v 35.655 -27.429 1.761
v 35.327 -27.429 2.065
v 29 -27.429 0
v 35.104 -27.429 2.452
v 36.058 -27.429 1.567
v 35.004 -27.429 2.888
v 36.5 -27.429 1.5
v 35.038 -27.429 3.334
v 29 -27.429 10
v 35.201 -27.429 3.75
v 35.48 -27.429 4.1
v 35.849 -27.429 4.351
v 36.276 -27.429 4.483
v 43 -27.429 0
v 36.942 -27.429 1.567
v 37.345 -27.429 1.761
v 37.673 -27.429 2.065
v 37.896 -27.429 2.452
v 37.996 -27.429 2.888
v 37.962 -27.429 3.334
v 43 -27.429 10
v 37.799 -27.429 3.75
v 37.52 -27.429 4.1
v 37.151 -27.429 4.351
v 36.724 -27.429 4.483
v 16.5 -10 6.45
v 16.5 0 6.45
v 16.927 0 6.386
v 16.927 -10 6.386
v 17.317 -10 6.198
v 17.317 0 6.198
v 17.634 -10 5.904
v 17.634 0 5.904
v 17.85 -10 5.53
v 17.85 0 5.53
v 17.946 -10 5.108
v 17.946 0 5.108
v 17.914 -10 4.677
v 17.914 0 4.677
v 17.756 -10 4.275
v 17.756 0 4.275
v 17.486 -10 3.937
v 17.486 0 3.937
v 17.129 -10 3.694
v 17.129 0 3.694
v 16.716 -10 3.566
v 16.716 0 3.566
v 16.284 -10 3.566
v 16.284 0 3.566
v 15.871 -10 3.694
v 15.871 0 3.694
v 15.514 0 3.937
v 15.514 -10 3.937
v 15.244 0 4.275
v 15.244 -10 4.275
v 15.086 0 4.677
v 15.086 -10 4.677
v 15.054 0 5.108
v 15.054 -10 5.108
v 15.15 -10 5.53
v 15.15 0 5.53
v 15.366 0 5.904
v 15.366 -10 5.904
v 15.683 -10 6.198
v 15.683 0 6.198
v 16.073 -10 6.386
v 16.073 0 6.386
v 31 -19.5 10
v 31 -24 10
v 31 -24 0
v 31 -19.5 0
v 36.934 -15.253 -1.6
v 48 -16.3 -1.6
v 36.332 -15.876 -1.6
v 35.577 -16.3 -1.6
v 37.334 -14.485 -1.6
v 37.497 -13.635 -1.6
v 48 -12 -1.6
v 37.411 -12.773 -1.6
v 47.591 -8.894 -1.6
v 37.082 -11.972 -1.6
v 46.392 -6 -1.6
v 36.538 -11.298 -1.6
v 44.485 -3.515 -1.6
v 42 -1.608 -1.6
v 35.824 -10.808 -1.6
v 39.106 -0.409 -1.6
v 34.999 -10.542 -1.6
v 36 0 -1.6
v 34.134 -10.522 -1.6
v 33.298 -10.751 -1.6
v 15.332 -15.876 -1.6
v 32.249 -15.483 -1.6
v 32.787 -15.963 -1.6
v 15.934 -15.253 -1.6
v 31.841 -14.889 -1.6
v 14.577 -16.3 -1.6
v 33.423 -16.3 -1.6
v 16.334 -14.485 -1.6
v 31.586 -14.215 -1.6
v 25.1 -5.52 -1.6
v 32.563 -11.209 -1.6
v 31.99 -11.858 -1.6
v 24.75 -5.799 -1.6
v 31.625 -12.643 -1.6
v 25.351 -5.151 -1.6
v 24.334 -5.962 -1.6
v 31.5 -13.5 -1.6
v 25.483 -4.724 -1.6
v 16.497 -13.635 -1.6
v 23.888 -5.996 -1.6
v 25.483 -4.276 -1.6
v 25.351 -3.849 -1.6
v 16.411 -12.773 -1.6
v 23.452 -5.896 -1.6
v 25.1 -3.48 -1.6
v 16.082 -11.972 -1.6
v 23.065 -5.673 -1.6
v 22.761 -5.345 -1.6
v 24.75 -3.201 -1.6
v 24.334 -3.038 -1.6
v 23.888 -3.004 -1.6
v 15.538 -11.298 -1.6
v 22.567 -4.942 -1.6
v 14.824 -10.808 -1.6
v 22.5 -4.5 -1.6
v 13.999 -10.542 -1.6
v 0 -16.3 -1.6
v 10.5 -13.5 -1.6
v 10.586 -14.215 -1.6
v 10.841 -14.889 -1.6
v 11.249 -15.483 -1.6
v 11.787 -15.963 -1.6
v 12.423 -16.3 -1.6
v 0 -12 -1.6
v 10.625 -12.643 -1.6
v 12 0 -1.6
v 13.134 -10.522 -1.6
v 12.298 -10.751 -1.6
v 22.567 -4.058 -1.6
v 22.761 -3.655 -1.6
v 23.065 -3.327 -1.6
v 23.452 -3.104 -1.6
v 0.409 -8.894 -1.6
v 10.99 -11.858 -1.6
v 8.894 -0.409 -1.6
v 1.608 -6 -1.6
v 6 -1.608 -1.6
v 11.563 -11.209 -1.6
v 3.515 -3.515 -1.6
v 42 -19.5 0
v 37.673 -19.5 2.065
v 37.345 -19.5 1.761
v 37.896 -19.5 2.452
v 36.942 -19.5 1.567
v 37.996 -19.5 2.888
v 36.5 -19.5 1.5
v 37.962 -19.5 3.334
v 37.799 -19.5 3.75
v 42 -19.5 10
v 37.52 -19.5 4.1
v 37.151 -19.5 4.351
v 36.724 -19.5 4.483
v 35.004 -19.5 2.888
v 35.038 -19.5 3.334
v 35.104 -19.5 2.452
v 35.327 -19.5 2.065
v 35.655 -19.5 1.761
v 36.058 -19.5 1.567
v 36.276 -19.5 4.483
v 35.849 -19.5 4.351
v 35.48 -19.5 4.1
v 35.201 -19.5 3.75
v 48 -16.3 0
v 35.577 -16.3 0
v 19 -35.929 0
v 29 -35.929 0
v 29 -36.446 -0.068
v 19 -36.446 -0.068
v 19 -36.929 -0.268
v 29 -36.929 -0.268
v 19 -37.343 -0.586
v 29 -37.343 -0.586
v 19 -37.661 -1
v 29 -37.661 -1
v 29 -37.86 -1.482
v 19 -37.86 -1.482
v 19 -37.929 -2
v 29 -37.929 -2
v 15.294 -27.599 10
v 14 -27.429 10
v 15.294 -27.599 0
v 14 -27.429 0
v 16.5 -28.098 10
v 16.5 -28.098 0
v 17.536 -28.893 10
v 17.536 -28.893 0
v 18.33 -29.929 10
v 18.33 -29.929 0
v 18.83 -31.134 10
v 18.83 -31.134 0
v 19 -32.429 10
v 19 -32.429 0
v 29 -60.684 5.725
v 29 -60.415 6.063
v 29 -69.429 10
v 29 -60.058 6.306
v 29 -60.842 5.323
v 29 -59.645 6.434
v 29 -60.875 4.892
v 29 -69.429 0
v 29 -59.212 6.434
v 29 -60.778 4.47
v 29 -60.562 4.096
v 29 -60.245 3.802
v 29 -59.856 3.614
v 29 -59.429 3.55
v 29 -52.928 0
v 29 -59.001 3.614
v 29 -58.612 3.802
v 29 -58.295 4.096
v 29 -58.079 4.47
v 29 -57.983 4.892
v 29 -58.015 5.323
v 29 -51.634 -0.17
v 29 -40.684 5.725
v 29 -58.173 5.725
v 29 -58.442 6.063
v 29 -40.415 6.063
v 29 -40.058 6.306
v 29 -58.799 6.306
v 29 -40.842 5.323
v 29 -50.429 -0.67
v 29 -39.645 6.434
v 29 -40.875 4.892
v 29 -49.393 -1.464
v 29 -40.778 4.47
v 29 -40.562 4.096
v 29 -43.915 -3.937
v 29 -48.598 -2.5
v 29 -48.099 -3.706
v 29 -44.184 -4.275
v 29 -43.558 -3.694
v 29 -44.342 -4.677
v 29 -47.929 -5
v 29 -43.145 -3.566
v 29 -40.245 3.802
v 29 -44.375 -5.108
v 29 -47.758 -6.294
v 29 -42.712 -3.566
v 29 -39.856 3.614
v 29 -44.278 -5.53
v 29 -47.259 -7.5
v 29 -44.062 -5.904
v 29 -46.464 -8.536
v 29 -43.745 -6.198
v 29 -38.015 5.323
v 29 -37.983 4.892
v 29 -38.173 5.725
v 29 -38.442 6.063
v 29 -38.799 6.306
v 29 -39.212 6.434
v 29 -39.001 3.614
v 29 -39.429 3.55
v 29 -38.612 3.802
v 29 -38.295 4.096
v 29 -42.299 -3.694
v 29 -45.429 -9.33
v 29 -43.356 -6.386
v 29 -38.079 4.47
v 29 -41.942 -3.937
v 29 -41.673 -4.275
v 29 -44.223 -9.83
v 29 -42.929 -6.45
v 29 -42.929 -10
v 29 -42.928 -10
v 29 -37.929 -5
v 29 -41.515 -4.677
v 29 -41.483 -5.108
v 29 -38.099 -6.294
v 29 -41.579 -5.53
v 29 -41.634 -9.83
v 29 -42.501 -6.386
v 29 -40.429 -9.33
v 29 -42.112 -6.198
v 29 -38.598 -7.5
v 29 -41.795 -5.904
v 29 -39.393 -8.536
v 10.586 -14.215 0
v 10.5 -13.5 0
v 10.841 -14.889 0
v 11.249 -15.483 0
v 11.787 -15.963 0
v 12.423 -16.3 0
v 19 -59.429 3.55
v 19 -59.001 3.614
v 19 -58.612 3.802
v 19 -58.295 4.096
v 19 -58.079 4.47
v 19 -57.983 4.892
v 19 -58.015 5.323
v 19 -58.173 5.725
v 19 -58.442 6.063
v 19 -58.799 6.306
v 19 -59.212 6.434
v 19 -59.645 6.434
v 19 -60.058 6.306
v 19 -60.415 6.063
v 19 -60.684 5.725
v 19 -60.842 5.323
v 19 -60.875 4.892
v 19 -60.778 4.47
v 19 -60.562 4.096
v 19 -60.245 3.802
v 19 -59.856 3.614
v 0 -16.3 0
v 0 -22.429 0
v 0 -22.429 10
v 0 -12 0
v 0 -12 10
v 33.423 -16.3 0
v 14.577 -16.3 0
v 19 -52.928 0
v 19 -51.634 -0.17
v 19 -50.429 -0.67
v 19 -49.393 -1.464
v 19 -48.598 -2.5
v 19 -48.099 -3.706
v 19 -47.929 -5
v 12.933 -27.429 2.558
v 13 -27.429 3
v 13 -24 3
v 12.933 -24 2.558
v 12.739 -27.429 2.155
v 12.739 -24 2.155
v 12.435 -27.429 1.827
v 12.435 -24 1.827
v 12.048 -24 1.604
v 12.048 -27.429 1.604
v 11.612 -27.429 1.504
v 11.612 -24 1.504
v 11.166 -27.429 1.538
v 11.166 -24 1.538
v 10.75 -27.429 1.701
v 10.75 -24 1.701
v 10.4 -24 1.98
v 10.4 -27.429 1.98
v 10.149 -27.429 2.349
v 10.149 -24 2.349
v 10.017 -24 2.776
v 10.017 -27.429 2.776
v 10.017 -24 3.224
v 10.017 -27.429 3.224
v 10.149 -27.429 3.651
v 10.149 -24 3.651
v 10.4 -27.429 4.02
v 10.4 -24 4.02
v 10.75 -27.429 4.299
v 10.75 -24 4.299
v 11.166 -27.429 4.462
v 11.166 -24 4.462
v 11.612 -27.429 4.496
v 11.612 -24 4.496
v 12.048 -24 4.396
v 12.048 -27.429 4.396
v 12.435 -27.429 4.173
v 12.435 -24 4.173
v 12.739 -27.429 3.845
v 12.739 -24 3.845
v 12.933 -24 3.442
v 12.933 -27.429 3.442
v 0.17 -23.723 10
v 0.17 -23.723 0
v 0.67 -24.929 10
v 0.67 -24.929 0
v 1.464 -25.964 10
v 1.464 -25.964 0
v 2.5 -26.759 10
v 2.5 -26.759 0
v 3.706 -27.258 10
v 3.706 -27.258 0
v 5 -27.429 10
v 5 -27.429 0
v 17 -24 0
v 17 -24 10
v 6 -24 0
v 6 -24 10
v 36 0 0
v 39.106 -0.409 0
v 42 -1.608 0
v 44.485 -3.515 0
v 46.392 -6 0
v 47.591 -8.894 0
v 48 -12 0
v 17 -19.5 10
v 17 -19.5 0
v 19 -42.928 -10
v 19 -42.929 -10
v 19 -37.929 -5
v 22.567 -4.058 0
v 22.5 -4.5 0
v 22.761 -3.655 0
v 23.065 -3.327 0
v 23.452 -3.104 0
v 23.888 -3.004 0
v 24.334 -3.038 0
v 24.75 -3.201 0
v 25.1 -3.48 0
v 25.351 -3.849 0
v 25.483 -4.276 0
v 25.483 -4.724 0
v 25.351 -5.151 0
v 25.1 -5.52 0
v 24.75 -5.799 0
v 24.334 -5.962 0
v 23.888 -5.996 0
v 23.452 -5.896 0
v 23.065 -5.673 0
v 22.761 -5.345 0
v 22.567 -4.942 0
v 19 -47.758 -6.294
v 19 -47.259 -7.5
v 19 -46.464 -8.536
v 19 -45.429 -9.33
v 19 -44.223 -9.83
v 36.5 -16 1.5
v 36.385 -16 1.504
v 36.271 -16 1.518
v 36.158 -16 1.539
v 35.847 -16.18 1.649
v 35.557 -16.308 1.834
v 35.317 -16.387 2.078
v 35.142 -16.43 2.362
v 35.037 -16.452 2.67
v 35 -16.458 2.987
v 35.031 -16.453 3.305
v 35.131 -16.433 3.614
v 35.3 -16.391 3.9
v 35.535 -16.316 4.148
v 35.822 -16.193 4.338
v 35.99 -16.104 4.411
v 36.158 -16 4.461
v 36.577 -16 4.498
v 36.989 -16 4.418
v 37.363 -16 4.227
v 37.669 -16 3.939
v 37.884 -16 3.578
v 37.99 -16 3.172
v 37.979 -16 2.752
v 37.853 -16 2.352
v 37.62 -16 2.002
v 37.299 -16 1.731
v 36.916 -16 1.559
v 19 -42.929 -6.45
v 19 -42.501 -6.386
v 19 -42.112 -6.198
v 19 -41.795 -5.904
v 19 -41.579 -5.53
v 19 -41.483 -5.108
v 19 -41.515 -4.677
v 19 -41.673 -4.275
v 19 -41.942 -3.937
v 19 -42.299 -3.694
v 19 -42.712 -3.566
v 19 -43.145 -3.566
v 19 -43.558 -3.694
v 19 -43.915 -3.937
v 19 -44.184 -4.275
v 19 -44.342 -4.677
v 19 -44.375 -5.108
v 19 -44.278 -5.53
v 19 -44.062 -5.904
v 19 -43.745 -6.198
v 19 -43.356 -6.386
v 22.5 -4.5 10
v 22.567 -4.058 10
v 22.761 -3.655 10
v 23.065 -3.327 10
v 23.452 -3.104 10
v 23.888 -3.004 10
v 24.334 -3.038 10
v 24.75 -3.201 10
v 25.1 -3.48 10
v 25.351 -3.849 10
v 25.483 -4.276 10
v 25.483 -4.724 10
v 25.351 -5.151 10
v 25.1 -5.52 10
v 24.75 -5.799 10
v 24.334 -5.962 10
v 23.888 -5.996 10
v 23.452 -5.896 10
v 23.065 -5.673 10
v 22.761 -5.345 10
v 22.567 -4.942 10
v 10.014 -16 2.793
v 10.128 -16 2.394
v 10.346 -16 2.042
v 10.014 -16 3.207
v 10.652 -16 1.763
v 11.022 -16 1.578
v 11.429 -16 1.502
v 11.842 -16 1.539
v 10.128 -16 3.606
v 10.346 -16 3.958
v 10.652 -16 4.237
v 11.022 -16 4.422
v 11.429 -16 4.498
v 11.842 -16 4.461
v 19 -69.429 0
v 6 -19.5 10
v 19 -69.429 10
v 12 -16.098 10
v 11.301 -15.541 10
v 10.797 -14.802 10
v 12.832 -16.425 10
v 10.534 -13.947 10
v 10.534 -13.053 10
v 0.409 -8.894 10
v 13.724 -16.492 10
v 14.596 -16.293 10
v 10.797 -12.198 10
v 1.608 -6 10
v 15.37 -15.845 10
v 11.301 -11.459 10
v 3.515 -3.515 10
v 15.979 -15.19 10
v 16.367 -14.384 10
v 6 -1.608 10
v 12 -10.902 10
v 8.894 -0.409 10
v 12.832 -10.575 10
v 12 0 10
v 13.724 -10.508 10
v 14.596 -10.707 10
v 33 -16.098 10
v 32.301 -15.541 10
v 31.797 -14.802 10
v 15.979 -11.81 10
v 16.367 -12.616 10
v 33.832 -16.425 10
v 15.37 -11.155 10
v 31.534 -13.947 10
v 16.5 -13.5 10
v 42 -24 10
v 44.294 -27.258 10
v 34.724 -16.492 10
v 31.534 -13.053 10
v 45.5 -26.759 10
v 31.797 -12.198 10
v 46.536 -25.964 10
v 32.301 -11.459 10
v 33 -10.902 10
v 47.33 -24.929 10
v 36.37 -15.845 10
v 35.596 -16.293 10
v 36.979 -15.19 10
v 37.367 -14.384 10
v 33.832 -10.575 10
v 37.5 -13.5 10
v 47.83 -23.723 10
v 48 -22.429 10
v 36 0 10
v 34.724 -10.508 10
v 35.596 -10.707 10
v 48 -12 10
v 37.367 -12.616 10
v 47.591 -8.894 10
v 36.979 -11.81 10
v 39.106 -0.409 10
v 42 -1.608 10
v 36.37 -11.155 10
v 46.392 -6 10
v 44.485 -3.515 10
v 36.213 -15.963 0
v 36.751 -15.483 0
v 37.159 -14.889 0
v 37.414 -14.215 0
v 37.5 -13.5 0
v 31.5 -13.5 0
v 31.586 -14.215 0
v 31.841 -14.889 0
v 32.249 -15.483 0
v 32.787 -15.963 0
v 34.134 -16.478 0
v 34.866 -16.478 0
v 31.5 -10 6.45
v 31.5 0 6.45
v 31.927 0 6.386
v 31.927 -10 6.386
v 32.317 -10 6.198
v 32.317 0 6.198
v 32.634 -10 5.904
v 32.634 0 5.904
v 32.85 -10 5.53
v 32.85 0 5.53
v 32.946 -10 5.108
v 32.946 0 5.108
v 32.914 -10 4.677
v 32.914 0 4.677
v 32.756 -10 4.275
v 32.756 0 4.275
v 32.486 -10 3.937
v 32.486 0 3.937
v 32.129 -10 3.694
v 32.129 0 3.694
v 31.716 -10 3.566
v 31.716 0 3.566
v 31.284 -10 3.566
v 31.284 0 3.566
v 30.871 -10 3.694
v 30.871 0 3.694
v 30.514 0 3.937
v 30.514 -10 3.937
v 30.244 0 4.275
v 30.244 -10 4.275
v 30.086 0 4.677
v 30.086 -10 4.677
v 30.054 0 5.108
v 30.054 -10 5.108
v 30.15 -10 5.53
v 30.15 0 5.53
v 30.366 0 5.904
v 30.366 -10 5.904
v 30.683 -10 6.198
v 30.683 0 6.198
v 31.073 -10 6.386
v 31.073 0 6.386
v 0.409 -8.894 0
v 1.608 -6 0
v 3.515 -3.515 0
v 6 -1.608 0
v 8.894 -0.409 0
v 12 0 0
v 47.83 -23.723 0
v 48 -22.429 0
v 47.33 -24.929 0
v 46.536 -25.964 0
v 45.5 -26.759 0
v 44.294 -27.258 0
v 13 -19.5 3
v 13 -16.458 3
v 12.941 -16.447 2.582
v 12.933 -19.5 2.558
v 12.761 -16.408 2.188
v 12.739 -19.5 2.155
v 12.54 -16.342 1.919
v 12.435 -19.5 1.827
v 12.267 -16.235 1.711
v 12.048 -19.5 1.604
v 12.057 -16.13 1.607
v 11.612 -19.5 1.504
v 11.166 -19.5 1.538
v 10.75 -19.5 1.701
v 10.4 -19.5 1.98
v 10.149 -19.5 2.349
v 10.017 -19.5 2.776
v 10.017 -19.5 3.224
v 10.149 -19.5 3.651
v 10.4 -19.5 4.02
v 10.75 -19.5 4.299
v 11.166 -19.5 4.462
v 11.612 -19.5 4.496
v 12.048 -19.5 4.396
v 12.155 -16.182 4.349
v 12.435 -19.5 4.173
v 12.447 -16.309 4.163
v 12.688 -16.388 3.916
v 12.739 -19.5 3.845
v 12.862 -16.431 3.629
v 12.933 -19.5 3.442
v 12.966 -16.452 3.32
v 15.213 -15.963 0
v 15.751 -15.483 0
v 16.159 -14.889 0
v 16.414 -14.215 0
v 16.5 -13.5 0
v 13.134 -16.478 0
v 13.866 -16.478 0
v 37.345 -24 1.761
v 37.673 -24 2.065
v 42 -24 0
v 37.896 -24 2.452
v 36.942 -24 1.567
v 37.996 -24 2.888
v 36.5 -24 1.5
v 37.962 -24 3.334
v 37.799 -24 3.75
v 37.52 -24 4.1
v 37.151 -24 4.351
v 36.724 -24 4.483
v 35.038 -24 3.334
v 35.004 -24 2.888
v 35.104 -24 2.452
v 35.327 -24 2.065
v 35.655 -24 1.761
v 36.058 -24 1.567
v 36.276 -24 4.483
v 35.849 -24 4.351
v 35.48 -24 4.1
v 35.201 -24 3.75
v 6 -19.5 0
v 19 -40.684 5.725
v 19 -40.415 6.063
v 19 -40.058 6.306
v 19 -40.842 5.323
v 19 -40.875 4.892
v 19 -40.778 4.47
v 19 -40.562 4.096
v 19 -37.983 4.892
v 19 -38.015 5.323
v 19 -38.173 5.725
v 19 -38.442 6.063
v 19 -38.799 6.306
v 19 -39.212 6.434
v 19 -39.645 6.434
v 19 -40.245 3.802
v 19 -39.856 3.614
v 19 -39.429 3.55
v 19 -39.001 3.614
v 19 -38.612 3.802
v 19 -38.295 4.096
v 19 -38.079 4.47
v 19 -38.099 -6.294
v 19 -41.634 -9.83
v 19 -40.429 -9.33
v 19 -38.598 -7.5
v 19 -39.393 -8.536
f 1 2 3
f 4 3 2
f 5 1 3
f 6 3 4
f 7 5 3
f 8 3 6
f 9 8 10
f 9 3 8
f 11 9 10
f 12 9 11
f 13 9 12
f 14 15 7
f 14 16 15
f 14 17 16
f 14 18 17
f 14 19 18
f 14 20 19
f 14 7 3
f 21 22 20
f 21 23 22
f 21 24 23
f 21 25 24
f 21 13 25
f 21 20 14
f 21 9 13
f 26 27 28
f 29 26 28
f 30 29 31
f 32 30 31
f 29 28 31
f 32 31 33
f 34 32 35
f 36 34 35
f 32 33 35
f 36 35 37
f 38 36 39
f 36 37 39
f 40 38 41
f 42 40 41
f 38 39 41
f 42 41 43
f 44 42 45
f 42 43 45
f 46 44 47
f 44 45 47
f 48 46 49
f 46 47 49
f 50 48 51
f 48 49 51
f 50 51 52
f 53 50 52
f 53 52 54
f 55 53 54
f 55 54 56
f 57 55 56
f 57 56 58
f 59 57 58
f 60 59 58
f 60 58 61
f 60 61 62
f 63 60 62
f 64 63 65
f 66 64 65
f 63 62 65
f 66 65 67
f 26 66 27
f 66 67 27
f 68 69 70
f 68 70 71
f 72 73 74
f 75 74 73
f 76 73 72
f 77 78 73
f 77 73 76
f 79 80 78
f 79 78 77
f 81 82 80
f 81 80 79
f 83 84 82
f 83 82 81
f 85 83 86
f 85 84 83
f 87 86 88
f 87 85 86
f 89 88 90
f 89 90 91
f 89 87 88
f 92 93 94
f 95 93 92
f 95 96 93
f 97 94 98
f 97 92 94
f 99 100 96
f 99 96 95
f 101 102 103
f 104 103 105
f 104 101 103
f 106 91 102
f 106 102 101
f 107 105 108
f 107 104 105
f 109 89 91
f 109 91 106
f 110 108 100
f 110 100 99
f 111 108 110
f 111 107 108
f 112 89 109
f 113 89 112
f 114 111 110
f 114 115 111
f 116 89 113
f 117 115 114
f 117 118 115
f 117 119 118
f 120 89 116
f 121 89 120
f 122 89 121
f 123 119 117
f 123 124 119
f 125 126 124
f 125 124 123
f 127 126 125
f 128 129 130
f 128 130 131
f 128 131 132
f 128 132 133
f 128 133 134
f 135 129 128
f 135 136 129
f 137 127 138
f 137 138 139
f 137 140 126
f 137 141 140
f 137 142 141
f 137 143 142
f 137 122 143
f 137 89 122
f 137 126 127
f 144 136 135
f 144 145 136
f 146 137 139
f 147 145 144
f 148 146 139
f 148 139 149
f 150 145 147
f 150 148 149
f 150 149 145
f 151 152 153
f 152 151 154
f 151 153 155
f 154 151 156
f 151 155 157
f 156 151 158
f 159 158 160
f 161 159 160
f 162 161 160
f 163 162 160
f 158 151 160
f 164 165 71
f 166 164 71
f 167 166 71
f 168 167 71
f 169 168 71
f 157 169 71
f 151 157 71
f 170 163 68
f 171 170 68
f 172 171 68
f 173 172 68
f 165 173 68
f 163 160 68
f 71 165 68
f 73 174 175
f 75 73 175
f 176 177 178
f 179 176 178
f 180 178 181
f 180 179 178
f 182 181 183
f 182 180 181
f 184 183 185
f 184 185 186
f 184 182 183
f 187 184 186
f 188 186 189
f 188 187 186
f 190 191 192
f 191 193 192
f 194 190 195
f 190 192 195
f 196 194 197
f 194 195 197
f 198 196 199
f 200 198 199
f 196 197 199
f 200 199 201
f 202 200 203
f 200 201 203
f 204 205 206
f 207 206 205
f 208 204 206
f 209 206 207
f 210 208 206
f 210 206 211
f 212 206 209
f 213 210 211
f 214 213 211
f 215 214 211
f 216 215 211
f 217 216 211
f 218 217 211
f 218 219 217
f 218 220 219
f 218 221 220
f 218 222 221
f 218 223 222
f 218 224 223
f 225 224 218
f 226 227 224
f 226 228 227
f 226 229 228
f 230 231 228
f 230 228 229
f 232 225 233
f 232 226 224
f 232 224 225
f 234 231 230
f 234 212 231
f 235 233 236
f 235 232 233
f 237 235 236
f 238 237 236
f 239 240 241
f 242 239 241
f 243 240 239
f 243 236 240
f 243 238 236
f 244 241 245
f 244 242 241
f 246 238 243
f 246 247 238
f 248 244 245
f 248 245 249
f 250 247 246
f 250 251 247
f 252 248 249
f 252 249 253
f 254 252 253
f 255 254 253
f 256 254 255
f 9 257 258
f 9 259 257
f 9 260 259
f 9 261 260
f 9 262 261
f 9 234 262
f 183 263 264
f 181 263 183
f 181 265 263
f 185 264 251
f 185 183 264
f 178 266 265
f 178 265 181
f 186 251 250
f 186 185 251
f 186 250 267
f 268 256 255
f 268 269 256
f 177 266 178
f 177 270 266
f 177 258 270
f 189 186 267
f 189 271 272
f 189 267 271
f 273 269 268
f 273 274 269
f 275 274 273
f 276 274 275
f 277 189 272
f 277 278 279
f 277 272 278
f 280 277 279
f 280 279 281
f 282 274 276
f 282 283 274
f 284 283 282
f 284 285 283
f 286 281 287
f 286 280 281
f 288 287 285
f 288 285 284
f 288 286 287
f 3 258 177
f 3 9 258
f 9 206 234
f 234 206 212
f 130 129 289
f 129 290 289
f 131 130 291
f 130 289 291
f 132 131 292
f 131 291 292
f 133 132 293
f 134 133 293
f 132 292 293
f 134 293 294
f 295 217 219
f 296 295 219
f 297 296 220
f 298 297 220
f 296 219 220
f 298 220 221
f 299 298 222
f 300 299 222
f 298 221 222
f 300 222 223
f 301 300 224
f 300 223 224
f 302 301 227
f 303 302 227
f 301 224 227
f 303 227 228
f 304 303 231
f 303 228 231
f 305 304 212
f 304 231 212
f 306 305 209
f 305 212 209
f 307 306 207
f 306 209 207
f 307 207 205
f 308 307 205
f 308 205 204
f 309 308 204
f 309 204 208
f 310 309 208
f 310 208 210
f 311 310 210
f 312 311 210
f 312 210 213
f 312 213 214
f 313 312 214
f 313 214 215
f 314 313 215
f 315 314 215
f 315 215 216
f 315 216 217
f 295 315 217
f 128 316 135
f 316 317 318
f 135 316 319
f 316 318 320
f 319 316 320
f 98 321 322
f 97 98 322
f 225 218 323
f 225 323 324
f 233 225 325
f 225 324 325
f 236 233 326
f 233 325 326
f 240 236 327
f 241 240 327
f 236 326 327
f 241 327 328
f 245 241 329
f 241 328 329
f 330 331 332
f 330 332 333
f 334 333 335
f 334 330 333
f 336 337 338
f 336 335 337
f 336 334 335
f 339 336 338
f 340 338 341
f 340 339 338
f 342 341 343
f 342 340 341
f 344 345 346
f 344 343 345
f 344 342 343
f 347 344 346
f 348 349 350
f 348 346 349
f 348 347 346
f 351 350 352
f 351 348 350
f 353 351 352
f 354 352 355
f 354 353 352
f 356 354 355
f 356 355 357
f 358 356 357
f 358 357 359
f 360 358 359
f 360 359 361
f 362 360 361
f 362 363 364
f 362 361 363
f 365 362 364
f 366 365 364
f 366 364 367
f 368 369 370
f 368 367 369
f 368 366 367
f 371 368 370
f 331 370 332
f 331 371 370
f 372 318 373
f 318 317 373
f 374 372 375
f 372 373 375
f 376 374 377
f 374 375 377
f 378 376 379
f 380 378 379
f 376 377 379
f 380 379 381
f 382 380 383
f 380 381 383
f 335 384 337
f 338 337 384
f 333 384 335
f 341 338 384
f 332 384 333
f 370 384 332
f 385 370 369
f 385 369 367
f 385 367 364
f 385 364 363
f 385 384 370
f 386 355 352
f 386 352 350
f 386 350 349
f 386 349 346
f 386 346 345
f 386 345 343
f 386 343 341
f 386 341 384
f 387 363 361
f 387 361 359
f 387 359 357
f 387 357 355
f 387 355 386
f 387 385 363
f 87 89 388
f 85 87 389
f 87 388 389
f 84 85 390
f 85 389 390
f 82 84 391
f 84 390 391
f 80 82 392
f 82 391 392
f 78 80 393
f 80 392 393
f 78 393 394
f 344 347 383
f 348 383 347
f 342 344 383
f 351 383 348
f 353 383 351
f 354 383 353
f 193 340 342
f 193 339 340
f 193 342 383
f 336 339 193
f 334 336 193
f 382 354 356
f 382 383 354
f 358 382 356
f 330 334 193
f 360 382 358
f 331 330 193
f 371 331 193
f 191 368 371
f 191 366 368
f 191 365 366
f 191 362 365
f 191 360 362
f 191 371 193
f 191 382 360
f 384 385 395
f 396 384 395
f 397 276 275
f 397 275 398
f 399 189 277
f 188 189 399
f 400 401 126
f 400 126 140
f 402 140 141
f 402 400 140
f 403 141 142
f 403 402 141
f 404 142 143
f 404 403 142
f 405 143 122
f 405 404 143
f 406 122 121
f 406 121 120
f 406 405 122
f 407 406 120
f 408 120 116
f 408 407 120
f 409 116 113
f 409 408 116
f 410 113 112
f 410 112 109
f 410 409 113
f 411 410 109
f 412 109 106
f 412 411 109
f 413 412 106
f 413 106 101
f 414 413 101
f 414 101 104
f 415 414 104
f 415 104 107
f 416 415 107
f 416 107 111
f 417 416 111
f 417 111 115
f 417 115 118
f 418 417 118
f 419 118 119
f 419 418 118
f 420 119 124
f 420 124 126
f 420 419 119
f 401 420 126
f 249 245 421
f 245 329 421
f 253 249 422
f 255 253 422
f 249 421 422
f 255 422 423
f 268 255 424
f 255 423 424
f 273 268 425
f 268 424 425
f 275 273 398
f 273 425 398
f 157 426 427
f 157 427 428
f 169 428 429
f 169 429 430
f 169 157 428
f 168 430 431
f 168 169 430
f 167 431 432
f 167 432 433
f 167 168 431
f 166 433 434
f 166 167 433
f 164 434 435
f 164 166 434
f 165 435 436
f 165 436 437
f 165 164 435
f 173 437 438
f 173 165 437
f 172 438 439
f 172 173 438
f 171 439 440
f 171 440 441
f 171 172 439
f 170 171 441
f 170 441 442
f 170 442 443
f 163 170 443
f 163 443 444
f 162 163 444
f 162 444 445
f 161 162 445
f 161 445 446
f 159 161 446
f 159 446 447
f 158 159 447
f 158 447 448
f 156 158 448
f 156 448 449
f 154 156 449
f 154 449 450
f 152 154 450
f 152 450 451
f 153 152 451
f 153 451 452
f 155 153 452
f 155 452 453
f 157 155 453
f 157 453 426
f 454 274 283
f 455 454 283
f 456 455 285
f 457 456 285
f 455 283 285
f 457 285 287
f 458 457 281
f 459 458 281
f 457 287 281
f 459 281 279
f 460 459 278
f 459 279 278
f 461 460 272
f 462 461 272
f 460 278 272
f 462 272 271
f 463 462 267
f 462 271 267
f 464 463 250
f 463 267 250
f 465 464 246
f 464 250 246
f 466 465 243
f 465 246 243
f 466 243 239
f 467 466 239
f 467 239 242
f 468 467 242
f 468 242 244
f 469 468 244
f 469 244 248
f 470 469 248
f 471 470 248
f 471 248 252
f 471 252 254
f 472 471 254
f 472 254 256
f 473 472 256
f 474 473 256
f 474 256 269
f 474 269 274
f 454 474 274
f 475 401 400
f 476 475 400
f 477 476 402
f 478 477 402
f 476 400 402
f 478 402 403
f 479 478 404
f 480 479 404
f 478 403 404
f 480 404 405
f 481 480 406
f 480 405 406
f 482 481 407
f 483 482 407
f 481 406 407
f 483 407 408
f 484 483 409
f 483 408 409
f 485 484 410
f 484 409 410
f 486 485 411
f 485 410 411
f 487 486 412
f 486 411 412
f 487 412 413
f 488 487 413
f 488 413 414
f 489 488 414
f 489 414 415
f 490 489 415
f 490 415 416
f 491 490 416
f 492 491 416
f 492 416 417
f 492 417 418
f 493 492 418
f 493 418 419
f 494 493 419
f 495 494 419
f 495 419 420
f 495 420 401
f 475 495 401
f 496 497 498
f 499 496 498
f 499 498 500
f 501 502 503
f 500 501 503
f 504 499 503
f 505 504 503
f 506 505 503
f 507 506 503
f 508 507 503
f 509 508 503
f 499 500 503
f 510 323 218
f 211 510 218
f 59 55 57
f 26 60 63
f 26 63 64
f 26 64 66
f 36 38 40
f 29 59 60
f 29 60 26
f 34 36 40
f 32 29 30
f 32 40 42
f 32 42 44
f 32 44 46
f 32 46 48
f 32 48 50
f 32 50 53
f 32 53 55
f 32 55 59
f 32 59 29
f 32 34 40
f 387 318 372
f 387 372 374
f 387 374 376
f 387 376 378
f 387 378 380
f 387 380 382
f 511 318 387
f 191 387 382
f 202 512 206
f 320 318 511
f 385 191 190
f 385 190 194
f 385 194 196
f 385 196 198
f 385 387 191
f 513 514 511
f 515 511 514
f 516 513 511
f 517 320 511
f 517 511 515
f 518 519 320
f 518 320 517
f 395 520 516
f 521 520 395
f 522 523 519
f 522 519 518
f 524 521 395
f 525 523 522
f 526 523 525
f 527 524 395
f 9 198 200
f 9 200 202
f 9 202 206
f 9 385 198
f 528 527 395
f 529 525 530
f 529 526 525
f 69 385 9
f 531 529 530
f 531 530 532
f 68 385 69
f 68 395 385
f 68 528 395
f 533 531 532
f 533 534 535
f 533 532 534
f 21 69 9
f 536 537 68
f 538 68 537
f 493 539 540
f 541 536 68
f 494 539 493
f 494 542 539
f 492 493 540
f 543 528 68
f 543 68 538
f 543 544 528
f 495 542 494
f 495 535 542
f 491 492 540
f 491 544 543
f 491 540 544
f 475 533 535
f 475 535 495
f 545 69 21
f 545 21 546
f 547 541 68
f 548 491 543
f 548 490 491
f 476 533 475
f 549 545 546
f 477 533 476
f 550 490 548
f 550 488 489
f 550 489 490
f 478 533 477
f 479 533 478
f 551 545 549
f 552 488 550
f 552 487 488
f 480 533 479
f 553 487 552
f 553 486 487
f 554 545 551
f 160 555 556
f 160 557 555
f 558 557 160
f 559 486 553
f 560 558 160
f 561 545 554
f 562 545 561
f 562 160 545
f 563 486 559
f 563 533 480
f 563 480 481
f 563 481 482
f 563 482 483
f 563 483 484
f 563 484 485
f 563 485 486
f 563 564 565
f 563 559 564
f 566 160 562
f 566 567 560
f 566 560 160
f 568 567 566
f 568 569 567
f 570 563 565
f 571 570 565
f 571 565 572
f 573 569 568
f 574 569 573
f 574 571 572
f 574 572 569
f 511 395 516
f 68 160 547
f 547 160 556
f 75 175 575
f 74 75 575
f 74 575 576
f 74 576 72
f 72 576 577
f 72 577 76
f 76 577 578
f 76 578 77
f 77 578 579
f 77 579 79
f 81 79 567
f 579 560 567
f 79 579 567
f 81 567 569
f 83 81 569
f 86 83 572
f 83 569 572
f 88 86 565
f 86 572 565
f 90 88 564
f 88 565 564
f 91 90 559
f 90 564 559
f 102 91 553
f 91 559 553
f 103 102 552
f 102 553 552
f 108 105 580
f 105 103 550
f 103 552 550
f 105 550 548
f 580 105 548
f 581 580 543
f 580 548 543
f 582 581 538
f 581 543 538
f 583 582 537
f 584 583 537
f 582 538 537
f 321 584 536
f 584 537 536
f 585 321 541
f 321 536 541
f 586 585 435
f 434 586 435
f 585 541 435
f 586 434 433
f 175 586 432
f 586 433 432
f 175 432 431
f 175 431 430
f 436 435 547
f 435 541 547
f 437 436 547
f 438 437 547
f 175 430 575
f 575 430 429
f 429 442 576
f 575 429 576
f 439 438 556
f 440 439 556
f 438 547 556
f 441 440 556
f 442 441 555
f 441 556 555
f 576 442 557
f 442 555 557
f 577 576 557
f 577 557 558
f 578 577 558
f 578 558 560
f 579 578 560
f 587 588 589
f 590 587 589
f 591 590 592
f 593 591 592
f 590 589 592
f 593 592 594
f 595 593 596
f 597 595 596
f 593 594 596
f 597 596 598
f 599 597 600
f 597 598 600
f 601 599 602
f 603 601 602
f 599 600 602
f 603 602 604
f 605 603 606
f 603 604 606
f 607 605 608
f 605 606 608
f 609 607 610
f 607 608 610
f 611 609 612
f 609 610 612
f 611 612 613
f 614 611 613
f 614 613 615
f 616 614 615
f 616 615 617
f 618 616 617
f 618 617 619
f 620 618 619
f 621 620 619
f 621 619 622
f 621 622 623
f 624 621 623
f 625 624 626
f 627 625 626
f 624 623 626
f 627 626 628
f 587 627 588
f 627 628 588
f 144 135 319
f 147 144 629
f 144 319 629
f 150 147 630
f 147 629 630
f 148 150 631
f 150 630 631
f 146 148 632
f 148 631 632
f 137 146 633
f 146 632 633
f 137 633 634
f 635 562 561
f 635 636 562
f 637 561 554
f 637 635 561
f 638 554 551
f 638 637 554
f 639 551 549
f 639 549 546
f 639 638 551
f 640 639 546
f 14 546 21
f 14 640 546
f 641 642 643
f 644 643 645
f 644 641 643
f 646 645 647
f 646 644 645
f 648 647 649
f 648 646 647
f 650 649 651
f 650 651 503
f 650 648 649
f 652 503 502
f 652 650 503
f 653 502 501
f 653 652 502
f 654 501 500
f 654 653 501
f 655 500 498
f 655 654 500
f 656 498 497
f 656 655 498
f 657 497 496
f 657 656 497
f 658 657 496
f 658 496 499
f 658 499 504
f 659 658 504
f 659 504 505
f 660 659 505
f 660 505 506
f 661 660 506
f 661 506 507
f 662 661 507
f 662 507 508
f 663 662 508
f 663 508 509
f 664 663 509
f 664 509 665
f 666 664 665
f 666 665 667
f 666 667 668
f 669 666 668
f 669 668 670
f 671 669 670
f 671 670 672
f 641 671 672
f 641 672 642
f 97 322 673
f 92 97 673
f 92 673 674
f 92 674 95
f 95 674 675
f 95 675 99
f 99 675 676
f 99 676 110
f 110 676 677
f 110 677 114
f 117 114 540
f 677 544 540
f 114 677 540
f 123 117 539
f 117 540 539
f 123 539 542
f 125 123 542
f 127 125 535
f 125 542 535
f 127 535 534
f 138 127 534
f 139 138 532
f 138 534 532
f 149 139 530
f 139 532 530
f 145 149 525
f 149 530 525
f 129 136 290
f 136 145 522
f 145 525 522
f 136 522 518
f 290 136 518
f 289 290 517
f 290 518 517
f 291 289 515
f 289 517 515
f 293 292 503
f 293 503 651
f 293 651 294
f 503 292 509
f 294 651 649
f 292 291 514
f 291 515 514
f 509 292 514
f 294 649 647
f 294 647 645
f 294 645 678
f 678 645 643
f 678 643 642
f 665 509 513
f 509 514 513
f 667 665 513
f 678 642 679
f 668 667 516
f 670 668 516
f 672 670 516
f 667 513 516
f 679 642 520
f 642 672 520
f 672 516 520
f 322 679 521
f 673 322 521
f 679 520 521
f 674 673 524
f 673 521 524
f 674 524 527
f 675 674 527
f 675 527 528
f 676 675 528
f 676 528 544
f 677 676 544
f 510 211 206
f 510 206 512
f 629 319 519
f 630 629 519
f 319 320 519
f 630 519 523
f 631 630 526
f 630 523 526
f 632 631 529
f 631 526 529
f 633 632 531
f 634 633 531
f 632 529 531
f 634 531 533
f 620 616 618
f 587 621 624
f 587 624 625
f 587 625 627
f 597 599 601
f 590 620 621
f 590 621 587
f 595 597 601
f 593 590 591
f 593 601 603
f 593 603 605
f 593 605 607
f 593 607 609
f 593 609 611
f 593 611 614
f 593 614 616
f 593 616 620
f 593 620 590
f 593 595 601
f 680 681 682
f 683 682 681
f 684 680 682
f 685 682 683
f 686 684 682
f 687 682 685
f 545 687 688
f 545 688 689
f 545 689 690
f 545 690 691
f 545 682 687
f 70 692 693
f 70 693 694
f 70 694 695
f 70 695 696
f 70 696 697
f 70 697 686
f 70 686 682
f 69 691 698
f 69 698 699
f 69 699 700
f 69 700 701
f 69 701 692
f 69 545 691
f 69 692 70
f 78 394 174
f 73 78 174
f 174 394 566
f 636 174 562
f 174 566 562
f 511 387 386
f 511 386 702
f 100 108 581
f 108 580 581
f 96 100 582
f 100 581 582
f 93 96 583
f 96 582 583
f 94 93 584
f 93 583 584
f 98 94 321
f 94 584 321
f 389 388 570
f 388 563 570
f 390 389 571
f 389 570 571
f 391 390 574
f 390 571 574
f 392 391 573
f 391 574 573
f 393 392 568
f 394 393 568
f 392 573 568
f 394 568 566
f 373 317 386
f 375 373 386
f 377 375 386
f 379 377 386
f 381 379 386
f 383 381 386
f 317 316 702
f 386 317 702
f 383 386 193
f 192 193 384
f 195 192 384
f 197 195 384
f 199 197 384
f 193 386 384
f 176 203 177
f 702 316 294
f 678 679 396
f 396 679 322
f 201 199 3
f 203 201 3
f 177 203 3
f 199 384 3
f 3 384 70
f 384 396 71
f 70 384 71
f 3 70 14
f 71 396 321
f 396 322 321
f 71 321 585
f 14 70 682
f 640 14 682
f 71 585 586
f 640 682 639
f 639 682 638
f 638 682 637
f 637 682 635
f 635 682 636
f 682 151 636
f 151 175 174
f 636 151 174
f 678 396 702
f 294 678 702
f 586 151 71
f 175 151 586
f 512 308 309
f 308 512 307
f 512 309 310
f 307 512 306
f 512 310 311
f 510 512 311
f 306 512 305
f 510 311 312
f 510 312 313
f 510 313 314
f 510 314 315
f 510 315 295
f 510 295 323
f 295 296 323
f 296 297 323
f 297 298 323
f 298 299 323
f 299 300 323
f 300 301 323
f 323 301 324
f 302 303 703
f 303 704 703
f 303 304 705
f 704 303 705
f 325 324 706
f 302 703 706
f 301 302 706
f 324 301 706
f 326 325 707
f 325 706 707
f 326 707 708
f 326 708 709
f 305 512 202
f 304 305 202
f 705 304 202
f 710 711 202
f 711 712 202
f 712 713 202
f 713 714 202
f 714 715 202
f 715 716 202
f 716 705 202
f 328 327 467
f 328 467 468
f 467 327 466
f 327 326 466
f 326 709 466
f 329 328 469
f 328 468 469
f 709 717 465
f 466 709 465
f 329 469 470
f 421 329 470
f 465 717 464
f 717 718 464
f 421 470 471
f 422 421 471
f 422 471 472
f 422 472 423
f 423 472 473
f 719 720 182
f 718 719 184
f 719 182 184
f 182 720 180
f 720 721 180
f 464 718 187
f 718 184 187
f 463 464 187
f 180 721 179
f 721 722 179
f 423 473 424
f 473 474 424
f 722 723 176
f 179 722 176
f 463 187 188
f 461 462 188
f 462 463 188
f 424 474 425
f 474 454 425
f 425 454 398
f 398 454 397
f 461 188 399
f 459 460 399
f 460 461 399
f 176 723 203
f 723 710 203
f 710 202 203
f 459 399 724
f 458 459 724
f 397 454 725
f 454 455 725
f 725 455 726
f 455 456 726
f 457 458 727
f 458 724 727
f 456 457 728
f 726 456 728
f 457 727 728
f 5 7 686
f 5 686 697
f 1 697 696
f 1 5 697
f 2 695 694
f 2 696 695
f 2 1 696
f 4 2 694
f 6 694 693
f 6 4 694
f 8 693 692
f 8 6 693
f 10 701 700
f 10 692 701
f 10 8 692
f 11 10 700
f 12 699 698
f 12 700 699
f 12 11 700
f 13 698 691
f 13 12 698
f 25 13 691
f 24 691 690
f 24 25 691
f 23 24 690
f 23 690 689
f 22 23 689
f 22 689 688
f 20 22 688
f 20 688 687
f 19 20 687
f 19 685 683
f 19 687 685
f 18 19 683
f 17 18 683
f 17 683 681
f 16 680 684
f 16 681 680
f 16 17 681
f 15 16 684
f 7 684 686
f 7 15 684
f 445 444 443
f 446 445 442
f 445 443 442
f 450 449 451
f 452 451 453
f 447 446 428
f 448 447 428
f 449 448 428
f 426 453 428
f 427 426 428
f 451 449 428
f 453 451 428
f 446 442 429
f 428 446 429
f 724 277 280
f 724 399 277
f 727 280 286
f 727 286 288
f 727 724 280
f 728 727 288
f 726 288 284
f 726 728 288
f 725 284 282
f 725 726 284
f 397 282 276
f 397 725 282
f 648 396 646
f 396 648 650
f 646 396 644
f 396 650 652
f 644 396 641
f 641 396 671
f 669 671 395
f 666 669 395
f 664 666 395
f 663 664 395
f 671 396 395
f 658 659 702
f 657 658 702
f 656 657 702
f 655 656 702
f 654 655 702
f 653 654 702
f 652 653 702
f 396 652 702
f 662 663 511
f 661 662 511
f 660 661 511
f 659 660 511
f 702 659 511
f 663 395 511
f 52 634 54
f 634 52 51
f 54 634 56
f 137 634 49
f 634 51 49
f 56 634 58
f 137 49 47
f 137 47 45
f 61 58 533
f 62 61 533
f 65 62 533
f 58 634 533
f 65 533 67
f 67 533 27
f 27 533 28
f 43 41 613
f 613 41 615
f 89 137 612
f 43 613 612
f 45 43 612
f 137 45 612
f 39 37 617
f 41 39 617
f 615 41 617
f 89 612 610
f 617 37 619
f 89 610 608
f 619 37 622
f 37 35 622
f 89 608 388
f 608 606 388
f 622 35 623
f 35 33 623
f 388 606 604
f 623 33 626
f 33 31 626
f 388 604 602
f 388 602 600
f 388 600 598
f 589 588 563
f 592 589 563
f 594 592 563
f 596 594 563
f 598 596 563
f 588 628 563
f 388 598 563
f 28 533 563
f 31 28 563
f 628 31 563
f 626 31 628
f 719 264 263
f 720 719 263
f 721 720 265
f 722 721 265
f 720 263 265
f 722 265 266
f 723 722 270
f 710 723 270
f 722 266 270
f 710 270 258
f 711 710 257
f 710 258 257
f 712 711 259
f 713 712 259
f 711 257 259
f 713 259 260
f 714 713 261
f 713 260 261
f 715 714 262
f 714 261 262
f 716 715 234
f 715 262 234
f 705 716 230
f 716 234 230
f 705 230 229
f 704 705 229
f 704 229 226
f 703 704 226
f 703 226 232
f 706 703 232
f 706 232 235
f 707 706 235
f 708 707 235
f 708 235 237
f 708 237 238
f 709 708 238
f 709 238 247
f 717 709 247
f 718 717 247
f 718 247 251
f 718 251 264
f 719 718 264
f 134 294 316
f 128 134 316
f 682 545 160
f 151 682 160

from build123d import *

# Parameters (mm, degrees)
SKETCH1_W               = 48
SKETCH1_H               = 70
BOSS_EXTRUDE1_DEPTH     = 10
SKETCH2_R               = 3
CUT_EXTRUDE1_DEPTH      = 86.463442477
SKETCH3_W               = 20.6
SKETCH3_H               = 20.6
CUT_EXTRUDE2_DEPTH      = 86.463442477
FILLET1_R               = 12
SKETCH4_R               = 1.5
CUT_EXTRUDE3_DEPTH      = 86.463442477
SKETCH5_R               = 1.45
CUT_EXTRUDE4_DEPTH      = 10
CUT_EXTRUDE5_DEPTH      = 86.463442477
CUT_EXTRUDE5_DEPTH_BACK = 86.463442477
SKETCH7_W               = 11
SKETCH7_H               = 4.5
SKETCH11_W              = 32
SKETCH11_H              = 15
CUT_EXTRUDE6_DEPTH      = 86.463442477
CUT_EXTRUDE7_DEPTH      = 8
CUT_EXTRUDE7_DEPTH_BACK = 5
SKETCH12_R              = 1.5
SKETCH13_R              = 1.5
BOSS_EXTRUDE4_DEPTH     = 1.6
FILLET2_R               = 8
SKETCH14_W              = 48
SKETCH14_H              = 42.571441548
CUT_EXTRUDE8_DEPTH      = 86.665395594
SKETCH15_W              = 10
SKETCH15_H              = 10
BOSS_EXTRUDE5_DEPTH     = 42
SKETCH18_W              = 10
SKETCH18_H              = 10
BOSS_EXTRUDE8_DEPTH     = 10
SKETCH19_R              = 1.45
CUT_EXTRUDE9_DEPTH      = 76.903390772
FILLET3_R               = 5
FILLET4_R               = 5
FILLET5_R               = 2


# Some blends are built 0.0001 mm under size
with BuildPart() as part:
    # Sketch1 → Boss-Extrude1 (new body)
    with BuildSketch(Plane.XY):
        with Locations((24, -35)):
            Rectangle(SKETCH1_W, SKETCH1_H)
    extrude(amount=BOSS_EXTRUDE1_DEPTH)

    # Sketch2 → Cut-Extrude1 (cut, through all)
    with BuildSketch(Plane.XY.offset(10)):
        with Locations((13.5, -13.5)):
            Circle(SKETCH2_R)
        with Locations((34.5, -13.5)):
            Circle(SKETCH2_R)
    extrude(amount=-CUT_EXTRUDE1_DEPTH, mode=Mode.SUBTRACT)

    # Sketch3 → Cut-Extrude2 (cut, through all)
    with BuildSketch(Plane.XY.offset(10)):
        with Locations((24, -48.8)):
            Rectangle(SKETCH3_W, SKETCH3_H)
    extrude(amount=-CUT_EXTRUDE2_DEPTH, mode=Mode.SUBTRACT)

    # Fillet1
    fillet1_edges = [part.edges().sort_by_distance(p)[0] for p in [
        (0, 0, 5),
        (48, 0, 5),
    ]]
    fillet(fillet1_edges, radius=FILLET1_R)

    # Sketch4 → Cut-Extrude3 (cut, through all)
    with BuildSketch(Plane(origin=(0, 0, 0), x_dir=(-1, 0, 0), z_dir=(0, 0, -1))):
        with Locations((-24, -4.5)):
            Circle(SKETCH4_R)
    extrude(amount=-CUT_EXTRUDE3_DEPTH, mode=Mode.SUBTRACT)

    # Sketch5 → Cut-Extrude4 (cut)
    with BuildSketch(Plane(origin=(0, 0, 0), x_dir=(1, 0, 0), z_dir=(0, 1, 0))):
        with Locations(Location((16.5, -5, 0), (0, 0, 270))):
            Circle(SKETCH5_R)
        with Locations(Location((31.5, -5, 0), (0, 0, 270))):
            Circle(SKETCH5_R)
    extrude(amount=-CUT_EXTRUDE4_DEPTH, mode=Mode.SUBTRACT)

    # Sketch7 → Cut-Extrude5 (cut, two sides: drawn at the far end of the back side and taken through both)
    with BuildSketch(Plane(origin=(0, 0, 0), x_dir=(-1, 0, 0), z_dir=(0, 0, -1)).offset(-CUT_EXTRUDE5_DEPTH_BACK)):
        with Locations((-36.5, -21.75)):
            Rectangle(SKETCH7_W, SKETCH7_H)
        with Locations((-11.5, -21.75)):
            Rectangle(SKETCH7_W, SKETCH7_H)
    extrude(amount=CUT_EXTRUDE5_DEPTH + CUT_EXTRUDE5_DEPTH_BACK, mode=Mode.SUBTRACT)

    # Sketch11 → Cut-Extrude6 (cut, through all)
    with BuildSketch(Plane(origin=(0, 0, 0), x_dir=(-1, 0, 0), z_dir=(0, 0, -1))):
        with Locations((-24, -35)):
            Rectangle(SKETCH11_W, SKETCH11_H)
    extrude(amount=-CUT_EXTRUDE6_DEPTH, mode=Mode.SUBTRACT)

    # Sketch12 → Cut-Extrude7 (cut, two sides: drawn at the far end of the back side and taken through both)
    with BuildSketch(Plane(origin=(0, -24, 0), x_dir=(1, 0, 0), z_dir=(0, 1, 0)).offset(-CUT_EXTRUDE7_DEPTH_BACK)):
        with Locations(Location((36.5, -3, 0), (0, 0, 90))):
            Circle(SKETCH12_R)
        with Locations((11.5, -3)):
            Circle(SKETCH12_R)
    extrude(amount=CUT_EXTRUDE7_DEPTH + CUT_EXTRUDE7_DEPTH_BACK, mode=Mode.SUBTRACT)

    # Sketch13 → Boss-Extrude4 (add)
    with BuildSketch(Plane(origin=(0, 0, 0), x_dir=(-1, 0, 0), z_dir=(0, 0, -1))):
        with BuildLine():
            Line((-48, -12), (-48, -16.3))
            Line((-48, -16.3), (-35.577032961, -16.3))
            ThreePointArc((-35.577032961, -16.3), (-36.198367027, -11.027036304), (-31.5, -13.5))
            ThreePointArc((-31.5, -13.5), (-32.027036304, -15.198367027), (-33.422967039, -16.3))
            Line((-33.422967039, -16.3), (-14.577032961, -16.3))
            ThreePointArc((-14.577032961, -16.3), (-15.198367027, -11.027036304), (-10.5, -13.5))
            ThreePointArc((-10.5, -13.5), (-11.027036304, -15.198367027), (-12.422967039, -16.3))
            Line((-12.422967039, -16.3), (0, -16.3))
            Line((0, -16.3), (0, -12))
            ThreePointArc((0, -12), (-3.514718626, -3.514718626), (-12, 0))
            Line((-12, 0), (-36, 0))
            ThreePointArc((-36, 0), (-44.485281374, -3.514718626), (-48, -12))
        make_face()
        with Locations((-24, -4.5)):
            Circle(SKETCH13_R, mode=Mode.SUBTRACT)
    extrude(amount=BOSS_EXTRUDE4_DEPTH)

    # Fillet2
    # the kernel refuses this fillet: 8 mm, written as the material it takes off along each edge
    with BuildSketch(Plane(origin=(13.7, -42.5, -19.155612754), x_dir=(-1, 0, 0), z_dir=(0, 0, 1))) as fillet2_piece_1:
        with BuildLine():
            CenterArc((8, 7.662245102), FILLET2_R, 180, 73.291656284)
            Line((0, 7.662245102), (-0.16, 7.662245102))
            Line((-0.16, 7.662245102), (-0.16, 0))
            Line((-0.16, 0), (0, -0.16))
            ThreePointArc((0, -0.16), (2.85, -0.16), (5.654, -0.153244902))
            Line((5.654, -0.153244902), (5.7, 0))
        make_face()
    extrude(amount=48.311225509, mode=Mode.SUBTRACT)
    with BuildSketch(Plane(origin=(34.3, -42.5, 29.155612754), x_dir=(0, -1, 0), z_dir=(0, 0, -1))) as fillet2_piece_2:
        with BuildLine():
            CenterArc((7.662245102, -8), FILLET2_R, 90, 73.291656284)
            Line((0, -5.7), (-0.153244902, -5.654))
            ThreePointArc((-0.153244902, -5.654), (-0.16, -2.85), (-0.16, 0))
            Line((-0.16, 0), (0, 0.16))
            Line((0, 0.16), (7.662245102, 0.16))
            Line((7.662245102, 0.16), (7.662245102, 0))
        make_face()
    extrude(amount=48.311225509, mode=Mode.SUBTRACT)

    # Sketch14 → Cut-Extrude8 (cut, through all)
    with BuildSketch(Plane.XY.offset(10)):
        with Locations((24, -48.714279226)):
            Rectangle(SKETCH14_W, SKETCH14_H)
    extrude(amount=-CUT_EXTRUDE8_DEPTH, mode=Mode.SUBTRACT)

    # Sketch15 → Boss-Extrude5 (add)
    with BuildSketch(Plane(origin=(0, -27.428558452, 0), x_dir=(-1, 0, 0), z_dir=(0, -1, 0))):
        with Locations((-24, -5)):
            Rectangle(SKETCH15_W, SKETCH15_H)
    extrude(amount=BOSS_EXTRUDE5_DEPTH)

    # Sketch18 → Boss-Extrude8 (add)
    with BuildSketch(Plane(origin=(0, 0, 0), x_dir=(-1, 0, 0), z_dir=(0, 0, -1))):
        with Locations((-24, -42.928558452)):
            Rectangle(SKETCH18_W, SKETCH18_H)
    extrude(amount=BOSS_EXTRUDE8_DEPTH)

    # Sketch19 → Cut-Extrude9 (cut, through all)
    with BuildSketch(Plane(origin=(29, 0, 0), x_dir=(0, 0, -1), z_dir=(1, 0, 0))):
        with Locations((5, -42.928558452)):
            Circle(SKETCH19_R)
        with Locations((-5, -59.428558452)):
            Circle(SKETCH19_R)
        with Locations((-5, -39.428558452)):
            Circle(SKETCH19_R)
    extrude(amount=-CUT_EXTRUDE9_DEPTH, mode=Mode.SUBTRACT)

    # Fillet3
    fillet3_edges = [part.edges().sort_by_distance(p)[0] for p in [
        (48, -27.428558452, 5),
        (0, -27.428558452, 5),
        (19, -27.428558452, 5),
    ]]
    fillet(fillet3_edges, radius=FILLET3_R)

    # Fillet4
    fillet4_edges = [part.edges().sort_by_distance(p)[0] for p in [
        (24, -47.928558452, 0),
        (24, -47.928558452, -10),
        (24, -37.928558452, -10),
    ]]
    fillet(fillet4_edges, radius=FILLET4_R - 0.0001)  # a hair under: the kernel refuses the full size

    # Fillet5
    fillet5_edges = [part.edges().sort_by_distance(p)[0] for p in [
        (24, -37.928558452, 0),
    ]]
    fillet(fillet5_edges, radius=FILLET5_R)


solid = part.part
